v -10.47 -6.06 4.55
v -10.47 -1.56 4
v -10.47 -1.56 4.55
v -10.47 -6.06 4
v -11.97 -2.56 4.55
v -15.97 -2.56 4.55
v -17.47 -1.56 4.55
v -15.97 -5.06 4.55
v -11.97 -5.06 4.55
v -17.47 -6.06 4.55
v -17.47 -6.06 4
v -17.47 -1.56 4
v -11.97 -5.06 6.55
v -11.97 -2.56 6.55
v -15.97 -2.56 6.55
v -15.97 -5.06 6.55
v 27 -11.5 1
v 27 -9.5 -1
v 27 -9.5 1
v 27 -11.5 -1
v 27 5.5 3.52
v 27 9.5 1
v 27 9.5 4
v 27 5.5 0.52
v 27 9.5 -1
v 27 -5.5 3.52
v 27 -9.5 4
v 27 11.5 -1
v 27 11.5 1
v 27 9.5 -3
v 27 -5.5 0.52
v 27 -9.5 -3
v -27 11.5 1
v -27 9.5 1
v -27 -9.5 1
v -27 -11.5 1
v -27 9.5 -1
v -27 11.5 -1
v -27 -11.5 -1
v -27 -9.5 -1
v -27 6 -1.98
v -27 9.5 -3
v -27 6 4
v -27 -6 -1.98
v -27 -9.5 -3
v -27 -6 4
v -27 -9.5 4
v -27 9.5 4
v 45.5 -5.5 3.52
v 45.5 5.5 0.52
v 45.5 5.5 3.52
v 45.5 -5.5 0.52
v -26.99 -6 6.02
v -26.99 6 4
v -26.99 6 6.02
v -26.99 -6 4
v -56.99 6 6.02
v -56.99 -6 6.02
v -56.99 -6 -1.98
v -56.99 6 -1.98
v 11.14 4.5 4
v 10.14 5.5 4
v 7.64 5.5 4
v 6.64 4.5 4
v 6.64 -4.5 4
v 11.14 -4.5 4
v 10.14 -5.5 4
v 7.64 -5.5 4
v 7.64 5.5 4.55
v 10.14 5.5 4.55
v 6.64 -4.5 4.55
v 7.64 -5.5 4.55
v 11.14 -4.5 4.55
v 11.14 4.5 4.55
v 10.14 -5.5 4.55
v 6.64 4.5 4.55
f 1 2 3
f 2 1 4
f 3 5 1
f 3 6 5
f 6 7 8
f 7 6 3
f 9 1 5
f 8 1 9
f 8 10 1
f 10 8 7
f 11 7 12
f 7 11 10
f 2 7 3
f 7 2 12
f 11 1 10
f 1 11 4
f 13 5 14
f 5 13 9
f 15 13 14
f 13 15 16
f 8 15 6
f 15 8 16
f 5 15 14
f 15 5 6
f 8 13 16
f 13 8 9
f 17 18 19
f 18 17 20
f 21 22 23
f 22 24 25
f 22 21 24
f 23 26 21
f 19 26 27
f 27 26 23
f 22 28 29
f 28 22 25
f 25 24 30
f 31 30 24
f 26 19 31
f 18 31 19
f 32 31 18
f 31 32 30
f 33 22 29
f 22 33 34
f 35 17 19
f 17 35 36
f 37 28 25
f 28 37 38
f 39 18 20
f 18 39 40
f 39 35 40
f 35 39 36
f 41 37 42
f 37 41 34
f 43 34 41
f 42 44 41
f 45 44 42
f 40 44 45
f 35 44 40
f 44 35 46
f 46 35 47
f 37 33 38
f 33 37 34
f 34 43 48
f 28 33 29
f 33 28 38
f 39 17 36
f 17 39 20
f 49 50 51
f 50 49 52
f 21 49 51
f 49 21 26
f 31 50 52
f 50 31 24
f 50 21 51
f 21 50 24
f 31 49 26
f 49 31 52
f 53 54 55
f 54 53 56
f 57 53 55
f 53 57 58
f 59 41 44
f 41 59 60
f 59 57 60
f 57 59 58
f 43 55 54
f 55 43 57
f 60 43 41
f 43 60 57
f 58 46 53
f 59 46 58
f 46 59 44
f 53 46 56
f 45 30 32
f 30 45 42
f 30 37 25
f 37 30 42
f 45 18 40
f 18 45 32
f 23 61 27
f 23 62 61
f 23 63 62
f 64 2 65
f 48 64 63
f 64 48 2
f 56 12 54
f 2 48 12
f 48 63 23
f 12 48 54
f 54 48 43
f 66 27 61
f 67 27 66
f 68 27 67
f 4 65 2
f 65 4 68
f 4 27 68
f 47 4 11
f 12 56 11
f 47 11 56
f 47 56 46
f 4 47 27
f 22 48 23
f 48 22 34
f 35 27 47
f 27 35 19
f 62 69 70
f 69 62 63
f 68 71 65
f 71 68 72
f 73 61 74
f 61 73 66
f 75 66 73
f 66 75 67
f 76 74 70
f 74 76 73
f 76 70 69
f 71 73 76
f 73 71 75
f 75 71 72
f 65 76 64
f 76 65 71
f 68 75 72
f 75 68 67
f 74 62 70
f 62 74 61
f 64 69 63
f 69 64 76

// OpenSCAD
// file: utils.scad
module rounded_square(size=1, center=false, r=1) {
  offset(r)
    offset(-r)
      square(size, center=center);
}

module chamfered_pocket(size=1, h=1) {
  intersection() {
    hull() {
      translate([0,0,h/2])
        cube([size.x, size.y, h], center=true);

      translate([0,0,1.5*h])
        cube([size.x+h*2, size.y+h*2, h], center=true);
    }
    translate([0,0,0.5*h])
      cube([size.x+h*2, size.y+h*2, h], center=true);
  }
}
// main file
use <utils.scad>

pin_size = 2.54;
depth=1.5;

module pin(with_dupond=false) {
  // plastic cube
  color([0.2, 0.2, 0.2]) translate([0, 0, pin_size/2])
    cube([pin_size, pin_size, pin_size], center=true);

  // pin
  color([0.7, 0.7, 0.7]) translate([0, 0, pin_size])
    cube([pin_size/5, pin_size/5, pin_size*4], center=true);

  // dupond
  if (with_dupond) {
    color([0.2, 0.2, 0.2]) translate([0, 0, 3.6*pin_size])
      cube([pin_size, pin_size, 5*pin_size], center=true);
    color([0.4, 0, 0.4]) translate([0, 0, 6*pin_size])
      cylinder(d=1, h=10);
  }
}

module blue_pill(boot_pins=true) {
  width=52.8;
  height=22.5;

  difference() {
    // PCB
    color([0, 0, 0.6])
      cube([width, height, depth], center=true);

    // holes
    for (i = [-3, 3])
      for (j = [0:19])
        translate([-pin_size * 19 / 2 + j * pin_size, i * pin_size, 0])
          cylinder(d=1, h=2*depth, center=true);
  }

  // MCU
  color([0.2, 0.2, 0.2])
    rotate([0, 0, 45])
      translate([0, 0, depth])
        cube([6.7, 6.7, depth], center=true);

  // USB
  color([0.7, 0.7, 0.7])
    translate([-(width-5.4)/2, 0, 2.6/2+depth/2])
      cube([5.4, 7.5, 2.6], center=true);

  // debugger
  for (i = [-1.5:1.5])
    translate([width / 2 - 4.7, i * pin_size, depth/2 + pin_size/2])
      rotate([0,90,0])
        pin(with_dupond=false);

  // boot pins
  if (boot_pins) {
  for (i=[0.5:1.5])
    for (j=[-6.5:-4.5])
      translate([j*pin_size, i*pin_size, depth/2])
        pin();
  }

  // HSE
  color([0.7, 0.7, 0.7]) translate([3.5*pin_size,0,depth/2]) linear_extrude(3)
    rounded_square([3.5,10], r=1, center=true);

  // LSE
  color([0.2, 0.2, 0.2]) translate([5.5*pin_size,0,depth/2+2.4/2])
    cube([3, 7.8, 2.4], center=true);

  // power led
  color([0.8, 0, 0]) translate([7*pin_size,3,depth/2+1/2])
    cube([1,1,1], center=true);

  // user led
  color([0, 0.8, 0]) translate([7*pin_size,-3,depth/2+1/2])
    cube([1,1,1], center=true);

  // reset
  color([0.9, 0.9, 0.9]) translate([-5.5*pin_size,-1.5*pin_size,depth/2+3.5/2]) {
    cube([6,3.5,3.5], center=true);
    cube([3,1.4,3.6+0.6], center=true);
  }
}

module blue_pill_pocket(under=2, over=3, open_under=false, open_over=false, led_holes=false) {
  difference() {
    union() {
      // PCB
      cube([54, 23, 2], center=true);

      // debugger
      translate([33, 0, (depth+pin_size)/2]) cube([25, 11, 3], center=true);

      // usb
      translate([-54/2+0.01-30/2, 0, (depth+pin_size)/2]) cube([30, 12, 8], center=true);

      // under
      translate([0, 0, -(under+1)/2])
        cube([54, 23-(open_under ? 0 : 4), under+1], center=true);

      // over
      translate([0, 0, (over+1)/2])
        cube([54, 23-(open_over ? 0 : 4), over+1], center=true);

      // HSE
      translate([3.5*pin_size,0,depth/2]) linear_extrude(3.8)
          rounded_square([4.5,11], r=1, center=true);

      // reset
      translate([-5.5*pin_size,-1.5*pin_size,depth/2+3.8/2]) {
        cube([7,4.5,3.8], center=true);
        cube([4,2.5,3.8+4], center=true);
      }

      // led_holes
      if (led_holes) {
        for (x=[-3,3]) {
          translate([7*pin_size,x,0]) cylinder(d=1.5, h=20);
        }
      }
    }
    if (led_holes) {
      translate([7*pin_size,0,over+1]) cube([3, 0.4, over*2], center=true);
    }
  }
}

blue_pill(boot_pins=false);
#blue_pill_pocket();
